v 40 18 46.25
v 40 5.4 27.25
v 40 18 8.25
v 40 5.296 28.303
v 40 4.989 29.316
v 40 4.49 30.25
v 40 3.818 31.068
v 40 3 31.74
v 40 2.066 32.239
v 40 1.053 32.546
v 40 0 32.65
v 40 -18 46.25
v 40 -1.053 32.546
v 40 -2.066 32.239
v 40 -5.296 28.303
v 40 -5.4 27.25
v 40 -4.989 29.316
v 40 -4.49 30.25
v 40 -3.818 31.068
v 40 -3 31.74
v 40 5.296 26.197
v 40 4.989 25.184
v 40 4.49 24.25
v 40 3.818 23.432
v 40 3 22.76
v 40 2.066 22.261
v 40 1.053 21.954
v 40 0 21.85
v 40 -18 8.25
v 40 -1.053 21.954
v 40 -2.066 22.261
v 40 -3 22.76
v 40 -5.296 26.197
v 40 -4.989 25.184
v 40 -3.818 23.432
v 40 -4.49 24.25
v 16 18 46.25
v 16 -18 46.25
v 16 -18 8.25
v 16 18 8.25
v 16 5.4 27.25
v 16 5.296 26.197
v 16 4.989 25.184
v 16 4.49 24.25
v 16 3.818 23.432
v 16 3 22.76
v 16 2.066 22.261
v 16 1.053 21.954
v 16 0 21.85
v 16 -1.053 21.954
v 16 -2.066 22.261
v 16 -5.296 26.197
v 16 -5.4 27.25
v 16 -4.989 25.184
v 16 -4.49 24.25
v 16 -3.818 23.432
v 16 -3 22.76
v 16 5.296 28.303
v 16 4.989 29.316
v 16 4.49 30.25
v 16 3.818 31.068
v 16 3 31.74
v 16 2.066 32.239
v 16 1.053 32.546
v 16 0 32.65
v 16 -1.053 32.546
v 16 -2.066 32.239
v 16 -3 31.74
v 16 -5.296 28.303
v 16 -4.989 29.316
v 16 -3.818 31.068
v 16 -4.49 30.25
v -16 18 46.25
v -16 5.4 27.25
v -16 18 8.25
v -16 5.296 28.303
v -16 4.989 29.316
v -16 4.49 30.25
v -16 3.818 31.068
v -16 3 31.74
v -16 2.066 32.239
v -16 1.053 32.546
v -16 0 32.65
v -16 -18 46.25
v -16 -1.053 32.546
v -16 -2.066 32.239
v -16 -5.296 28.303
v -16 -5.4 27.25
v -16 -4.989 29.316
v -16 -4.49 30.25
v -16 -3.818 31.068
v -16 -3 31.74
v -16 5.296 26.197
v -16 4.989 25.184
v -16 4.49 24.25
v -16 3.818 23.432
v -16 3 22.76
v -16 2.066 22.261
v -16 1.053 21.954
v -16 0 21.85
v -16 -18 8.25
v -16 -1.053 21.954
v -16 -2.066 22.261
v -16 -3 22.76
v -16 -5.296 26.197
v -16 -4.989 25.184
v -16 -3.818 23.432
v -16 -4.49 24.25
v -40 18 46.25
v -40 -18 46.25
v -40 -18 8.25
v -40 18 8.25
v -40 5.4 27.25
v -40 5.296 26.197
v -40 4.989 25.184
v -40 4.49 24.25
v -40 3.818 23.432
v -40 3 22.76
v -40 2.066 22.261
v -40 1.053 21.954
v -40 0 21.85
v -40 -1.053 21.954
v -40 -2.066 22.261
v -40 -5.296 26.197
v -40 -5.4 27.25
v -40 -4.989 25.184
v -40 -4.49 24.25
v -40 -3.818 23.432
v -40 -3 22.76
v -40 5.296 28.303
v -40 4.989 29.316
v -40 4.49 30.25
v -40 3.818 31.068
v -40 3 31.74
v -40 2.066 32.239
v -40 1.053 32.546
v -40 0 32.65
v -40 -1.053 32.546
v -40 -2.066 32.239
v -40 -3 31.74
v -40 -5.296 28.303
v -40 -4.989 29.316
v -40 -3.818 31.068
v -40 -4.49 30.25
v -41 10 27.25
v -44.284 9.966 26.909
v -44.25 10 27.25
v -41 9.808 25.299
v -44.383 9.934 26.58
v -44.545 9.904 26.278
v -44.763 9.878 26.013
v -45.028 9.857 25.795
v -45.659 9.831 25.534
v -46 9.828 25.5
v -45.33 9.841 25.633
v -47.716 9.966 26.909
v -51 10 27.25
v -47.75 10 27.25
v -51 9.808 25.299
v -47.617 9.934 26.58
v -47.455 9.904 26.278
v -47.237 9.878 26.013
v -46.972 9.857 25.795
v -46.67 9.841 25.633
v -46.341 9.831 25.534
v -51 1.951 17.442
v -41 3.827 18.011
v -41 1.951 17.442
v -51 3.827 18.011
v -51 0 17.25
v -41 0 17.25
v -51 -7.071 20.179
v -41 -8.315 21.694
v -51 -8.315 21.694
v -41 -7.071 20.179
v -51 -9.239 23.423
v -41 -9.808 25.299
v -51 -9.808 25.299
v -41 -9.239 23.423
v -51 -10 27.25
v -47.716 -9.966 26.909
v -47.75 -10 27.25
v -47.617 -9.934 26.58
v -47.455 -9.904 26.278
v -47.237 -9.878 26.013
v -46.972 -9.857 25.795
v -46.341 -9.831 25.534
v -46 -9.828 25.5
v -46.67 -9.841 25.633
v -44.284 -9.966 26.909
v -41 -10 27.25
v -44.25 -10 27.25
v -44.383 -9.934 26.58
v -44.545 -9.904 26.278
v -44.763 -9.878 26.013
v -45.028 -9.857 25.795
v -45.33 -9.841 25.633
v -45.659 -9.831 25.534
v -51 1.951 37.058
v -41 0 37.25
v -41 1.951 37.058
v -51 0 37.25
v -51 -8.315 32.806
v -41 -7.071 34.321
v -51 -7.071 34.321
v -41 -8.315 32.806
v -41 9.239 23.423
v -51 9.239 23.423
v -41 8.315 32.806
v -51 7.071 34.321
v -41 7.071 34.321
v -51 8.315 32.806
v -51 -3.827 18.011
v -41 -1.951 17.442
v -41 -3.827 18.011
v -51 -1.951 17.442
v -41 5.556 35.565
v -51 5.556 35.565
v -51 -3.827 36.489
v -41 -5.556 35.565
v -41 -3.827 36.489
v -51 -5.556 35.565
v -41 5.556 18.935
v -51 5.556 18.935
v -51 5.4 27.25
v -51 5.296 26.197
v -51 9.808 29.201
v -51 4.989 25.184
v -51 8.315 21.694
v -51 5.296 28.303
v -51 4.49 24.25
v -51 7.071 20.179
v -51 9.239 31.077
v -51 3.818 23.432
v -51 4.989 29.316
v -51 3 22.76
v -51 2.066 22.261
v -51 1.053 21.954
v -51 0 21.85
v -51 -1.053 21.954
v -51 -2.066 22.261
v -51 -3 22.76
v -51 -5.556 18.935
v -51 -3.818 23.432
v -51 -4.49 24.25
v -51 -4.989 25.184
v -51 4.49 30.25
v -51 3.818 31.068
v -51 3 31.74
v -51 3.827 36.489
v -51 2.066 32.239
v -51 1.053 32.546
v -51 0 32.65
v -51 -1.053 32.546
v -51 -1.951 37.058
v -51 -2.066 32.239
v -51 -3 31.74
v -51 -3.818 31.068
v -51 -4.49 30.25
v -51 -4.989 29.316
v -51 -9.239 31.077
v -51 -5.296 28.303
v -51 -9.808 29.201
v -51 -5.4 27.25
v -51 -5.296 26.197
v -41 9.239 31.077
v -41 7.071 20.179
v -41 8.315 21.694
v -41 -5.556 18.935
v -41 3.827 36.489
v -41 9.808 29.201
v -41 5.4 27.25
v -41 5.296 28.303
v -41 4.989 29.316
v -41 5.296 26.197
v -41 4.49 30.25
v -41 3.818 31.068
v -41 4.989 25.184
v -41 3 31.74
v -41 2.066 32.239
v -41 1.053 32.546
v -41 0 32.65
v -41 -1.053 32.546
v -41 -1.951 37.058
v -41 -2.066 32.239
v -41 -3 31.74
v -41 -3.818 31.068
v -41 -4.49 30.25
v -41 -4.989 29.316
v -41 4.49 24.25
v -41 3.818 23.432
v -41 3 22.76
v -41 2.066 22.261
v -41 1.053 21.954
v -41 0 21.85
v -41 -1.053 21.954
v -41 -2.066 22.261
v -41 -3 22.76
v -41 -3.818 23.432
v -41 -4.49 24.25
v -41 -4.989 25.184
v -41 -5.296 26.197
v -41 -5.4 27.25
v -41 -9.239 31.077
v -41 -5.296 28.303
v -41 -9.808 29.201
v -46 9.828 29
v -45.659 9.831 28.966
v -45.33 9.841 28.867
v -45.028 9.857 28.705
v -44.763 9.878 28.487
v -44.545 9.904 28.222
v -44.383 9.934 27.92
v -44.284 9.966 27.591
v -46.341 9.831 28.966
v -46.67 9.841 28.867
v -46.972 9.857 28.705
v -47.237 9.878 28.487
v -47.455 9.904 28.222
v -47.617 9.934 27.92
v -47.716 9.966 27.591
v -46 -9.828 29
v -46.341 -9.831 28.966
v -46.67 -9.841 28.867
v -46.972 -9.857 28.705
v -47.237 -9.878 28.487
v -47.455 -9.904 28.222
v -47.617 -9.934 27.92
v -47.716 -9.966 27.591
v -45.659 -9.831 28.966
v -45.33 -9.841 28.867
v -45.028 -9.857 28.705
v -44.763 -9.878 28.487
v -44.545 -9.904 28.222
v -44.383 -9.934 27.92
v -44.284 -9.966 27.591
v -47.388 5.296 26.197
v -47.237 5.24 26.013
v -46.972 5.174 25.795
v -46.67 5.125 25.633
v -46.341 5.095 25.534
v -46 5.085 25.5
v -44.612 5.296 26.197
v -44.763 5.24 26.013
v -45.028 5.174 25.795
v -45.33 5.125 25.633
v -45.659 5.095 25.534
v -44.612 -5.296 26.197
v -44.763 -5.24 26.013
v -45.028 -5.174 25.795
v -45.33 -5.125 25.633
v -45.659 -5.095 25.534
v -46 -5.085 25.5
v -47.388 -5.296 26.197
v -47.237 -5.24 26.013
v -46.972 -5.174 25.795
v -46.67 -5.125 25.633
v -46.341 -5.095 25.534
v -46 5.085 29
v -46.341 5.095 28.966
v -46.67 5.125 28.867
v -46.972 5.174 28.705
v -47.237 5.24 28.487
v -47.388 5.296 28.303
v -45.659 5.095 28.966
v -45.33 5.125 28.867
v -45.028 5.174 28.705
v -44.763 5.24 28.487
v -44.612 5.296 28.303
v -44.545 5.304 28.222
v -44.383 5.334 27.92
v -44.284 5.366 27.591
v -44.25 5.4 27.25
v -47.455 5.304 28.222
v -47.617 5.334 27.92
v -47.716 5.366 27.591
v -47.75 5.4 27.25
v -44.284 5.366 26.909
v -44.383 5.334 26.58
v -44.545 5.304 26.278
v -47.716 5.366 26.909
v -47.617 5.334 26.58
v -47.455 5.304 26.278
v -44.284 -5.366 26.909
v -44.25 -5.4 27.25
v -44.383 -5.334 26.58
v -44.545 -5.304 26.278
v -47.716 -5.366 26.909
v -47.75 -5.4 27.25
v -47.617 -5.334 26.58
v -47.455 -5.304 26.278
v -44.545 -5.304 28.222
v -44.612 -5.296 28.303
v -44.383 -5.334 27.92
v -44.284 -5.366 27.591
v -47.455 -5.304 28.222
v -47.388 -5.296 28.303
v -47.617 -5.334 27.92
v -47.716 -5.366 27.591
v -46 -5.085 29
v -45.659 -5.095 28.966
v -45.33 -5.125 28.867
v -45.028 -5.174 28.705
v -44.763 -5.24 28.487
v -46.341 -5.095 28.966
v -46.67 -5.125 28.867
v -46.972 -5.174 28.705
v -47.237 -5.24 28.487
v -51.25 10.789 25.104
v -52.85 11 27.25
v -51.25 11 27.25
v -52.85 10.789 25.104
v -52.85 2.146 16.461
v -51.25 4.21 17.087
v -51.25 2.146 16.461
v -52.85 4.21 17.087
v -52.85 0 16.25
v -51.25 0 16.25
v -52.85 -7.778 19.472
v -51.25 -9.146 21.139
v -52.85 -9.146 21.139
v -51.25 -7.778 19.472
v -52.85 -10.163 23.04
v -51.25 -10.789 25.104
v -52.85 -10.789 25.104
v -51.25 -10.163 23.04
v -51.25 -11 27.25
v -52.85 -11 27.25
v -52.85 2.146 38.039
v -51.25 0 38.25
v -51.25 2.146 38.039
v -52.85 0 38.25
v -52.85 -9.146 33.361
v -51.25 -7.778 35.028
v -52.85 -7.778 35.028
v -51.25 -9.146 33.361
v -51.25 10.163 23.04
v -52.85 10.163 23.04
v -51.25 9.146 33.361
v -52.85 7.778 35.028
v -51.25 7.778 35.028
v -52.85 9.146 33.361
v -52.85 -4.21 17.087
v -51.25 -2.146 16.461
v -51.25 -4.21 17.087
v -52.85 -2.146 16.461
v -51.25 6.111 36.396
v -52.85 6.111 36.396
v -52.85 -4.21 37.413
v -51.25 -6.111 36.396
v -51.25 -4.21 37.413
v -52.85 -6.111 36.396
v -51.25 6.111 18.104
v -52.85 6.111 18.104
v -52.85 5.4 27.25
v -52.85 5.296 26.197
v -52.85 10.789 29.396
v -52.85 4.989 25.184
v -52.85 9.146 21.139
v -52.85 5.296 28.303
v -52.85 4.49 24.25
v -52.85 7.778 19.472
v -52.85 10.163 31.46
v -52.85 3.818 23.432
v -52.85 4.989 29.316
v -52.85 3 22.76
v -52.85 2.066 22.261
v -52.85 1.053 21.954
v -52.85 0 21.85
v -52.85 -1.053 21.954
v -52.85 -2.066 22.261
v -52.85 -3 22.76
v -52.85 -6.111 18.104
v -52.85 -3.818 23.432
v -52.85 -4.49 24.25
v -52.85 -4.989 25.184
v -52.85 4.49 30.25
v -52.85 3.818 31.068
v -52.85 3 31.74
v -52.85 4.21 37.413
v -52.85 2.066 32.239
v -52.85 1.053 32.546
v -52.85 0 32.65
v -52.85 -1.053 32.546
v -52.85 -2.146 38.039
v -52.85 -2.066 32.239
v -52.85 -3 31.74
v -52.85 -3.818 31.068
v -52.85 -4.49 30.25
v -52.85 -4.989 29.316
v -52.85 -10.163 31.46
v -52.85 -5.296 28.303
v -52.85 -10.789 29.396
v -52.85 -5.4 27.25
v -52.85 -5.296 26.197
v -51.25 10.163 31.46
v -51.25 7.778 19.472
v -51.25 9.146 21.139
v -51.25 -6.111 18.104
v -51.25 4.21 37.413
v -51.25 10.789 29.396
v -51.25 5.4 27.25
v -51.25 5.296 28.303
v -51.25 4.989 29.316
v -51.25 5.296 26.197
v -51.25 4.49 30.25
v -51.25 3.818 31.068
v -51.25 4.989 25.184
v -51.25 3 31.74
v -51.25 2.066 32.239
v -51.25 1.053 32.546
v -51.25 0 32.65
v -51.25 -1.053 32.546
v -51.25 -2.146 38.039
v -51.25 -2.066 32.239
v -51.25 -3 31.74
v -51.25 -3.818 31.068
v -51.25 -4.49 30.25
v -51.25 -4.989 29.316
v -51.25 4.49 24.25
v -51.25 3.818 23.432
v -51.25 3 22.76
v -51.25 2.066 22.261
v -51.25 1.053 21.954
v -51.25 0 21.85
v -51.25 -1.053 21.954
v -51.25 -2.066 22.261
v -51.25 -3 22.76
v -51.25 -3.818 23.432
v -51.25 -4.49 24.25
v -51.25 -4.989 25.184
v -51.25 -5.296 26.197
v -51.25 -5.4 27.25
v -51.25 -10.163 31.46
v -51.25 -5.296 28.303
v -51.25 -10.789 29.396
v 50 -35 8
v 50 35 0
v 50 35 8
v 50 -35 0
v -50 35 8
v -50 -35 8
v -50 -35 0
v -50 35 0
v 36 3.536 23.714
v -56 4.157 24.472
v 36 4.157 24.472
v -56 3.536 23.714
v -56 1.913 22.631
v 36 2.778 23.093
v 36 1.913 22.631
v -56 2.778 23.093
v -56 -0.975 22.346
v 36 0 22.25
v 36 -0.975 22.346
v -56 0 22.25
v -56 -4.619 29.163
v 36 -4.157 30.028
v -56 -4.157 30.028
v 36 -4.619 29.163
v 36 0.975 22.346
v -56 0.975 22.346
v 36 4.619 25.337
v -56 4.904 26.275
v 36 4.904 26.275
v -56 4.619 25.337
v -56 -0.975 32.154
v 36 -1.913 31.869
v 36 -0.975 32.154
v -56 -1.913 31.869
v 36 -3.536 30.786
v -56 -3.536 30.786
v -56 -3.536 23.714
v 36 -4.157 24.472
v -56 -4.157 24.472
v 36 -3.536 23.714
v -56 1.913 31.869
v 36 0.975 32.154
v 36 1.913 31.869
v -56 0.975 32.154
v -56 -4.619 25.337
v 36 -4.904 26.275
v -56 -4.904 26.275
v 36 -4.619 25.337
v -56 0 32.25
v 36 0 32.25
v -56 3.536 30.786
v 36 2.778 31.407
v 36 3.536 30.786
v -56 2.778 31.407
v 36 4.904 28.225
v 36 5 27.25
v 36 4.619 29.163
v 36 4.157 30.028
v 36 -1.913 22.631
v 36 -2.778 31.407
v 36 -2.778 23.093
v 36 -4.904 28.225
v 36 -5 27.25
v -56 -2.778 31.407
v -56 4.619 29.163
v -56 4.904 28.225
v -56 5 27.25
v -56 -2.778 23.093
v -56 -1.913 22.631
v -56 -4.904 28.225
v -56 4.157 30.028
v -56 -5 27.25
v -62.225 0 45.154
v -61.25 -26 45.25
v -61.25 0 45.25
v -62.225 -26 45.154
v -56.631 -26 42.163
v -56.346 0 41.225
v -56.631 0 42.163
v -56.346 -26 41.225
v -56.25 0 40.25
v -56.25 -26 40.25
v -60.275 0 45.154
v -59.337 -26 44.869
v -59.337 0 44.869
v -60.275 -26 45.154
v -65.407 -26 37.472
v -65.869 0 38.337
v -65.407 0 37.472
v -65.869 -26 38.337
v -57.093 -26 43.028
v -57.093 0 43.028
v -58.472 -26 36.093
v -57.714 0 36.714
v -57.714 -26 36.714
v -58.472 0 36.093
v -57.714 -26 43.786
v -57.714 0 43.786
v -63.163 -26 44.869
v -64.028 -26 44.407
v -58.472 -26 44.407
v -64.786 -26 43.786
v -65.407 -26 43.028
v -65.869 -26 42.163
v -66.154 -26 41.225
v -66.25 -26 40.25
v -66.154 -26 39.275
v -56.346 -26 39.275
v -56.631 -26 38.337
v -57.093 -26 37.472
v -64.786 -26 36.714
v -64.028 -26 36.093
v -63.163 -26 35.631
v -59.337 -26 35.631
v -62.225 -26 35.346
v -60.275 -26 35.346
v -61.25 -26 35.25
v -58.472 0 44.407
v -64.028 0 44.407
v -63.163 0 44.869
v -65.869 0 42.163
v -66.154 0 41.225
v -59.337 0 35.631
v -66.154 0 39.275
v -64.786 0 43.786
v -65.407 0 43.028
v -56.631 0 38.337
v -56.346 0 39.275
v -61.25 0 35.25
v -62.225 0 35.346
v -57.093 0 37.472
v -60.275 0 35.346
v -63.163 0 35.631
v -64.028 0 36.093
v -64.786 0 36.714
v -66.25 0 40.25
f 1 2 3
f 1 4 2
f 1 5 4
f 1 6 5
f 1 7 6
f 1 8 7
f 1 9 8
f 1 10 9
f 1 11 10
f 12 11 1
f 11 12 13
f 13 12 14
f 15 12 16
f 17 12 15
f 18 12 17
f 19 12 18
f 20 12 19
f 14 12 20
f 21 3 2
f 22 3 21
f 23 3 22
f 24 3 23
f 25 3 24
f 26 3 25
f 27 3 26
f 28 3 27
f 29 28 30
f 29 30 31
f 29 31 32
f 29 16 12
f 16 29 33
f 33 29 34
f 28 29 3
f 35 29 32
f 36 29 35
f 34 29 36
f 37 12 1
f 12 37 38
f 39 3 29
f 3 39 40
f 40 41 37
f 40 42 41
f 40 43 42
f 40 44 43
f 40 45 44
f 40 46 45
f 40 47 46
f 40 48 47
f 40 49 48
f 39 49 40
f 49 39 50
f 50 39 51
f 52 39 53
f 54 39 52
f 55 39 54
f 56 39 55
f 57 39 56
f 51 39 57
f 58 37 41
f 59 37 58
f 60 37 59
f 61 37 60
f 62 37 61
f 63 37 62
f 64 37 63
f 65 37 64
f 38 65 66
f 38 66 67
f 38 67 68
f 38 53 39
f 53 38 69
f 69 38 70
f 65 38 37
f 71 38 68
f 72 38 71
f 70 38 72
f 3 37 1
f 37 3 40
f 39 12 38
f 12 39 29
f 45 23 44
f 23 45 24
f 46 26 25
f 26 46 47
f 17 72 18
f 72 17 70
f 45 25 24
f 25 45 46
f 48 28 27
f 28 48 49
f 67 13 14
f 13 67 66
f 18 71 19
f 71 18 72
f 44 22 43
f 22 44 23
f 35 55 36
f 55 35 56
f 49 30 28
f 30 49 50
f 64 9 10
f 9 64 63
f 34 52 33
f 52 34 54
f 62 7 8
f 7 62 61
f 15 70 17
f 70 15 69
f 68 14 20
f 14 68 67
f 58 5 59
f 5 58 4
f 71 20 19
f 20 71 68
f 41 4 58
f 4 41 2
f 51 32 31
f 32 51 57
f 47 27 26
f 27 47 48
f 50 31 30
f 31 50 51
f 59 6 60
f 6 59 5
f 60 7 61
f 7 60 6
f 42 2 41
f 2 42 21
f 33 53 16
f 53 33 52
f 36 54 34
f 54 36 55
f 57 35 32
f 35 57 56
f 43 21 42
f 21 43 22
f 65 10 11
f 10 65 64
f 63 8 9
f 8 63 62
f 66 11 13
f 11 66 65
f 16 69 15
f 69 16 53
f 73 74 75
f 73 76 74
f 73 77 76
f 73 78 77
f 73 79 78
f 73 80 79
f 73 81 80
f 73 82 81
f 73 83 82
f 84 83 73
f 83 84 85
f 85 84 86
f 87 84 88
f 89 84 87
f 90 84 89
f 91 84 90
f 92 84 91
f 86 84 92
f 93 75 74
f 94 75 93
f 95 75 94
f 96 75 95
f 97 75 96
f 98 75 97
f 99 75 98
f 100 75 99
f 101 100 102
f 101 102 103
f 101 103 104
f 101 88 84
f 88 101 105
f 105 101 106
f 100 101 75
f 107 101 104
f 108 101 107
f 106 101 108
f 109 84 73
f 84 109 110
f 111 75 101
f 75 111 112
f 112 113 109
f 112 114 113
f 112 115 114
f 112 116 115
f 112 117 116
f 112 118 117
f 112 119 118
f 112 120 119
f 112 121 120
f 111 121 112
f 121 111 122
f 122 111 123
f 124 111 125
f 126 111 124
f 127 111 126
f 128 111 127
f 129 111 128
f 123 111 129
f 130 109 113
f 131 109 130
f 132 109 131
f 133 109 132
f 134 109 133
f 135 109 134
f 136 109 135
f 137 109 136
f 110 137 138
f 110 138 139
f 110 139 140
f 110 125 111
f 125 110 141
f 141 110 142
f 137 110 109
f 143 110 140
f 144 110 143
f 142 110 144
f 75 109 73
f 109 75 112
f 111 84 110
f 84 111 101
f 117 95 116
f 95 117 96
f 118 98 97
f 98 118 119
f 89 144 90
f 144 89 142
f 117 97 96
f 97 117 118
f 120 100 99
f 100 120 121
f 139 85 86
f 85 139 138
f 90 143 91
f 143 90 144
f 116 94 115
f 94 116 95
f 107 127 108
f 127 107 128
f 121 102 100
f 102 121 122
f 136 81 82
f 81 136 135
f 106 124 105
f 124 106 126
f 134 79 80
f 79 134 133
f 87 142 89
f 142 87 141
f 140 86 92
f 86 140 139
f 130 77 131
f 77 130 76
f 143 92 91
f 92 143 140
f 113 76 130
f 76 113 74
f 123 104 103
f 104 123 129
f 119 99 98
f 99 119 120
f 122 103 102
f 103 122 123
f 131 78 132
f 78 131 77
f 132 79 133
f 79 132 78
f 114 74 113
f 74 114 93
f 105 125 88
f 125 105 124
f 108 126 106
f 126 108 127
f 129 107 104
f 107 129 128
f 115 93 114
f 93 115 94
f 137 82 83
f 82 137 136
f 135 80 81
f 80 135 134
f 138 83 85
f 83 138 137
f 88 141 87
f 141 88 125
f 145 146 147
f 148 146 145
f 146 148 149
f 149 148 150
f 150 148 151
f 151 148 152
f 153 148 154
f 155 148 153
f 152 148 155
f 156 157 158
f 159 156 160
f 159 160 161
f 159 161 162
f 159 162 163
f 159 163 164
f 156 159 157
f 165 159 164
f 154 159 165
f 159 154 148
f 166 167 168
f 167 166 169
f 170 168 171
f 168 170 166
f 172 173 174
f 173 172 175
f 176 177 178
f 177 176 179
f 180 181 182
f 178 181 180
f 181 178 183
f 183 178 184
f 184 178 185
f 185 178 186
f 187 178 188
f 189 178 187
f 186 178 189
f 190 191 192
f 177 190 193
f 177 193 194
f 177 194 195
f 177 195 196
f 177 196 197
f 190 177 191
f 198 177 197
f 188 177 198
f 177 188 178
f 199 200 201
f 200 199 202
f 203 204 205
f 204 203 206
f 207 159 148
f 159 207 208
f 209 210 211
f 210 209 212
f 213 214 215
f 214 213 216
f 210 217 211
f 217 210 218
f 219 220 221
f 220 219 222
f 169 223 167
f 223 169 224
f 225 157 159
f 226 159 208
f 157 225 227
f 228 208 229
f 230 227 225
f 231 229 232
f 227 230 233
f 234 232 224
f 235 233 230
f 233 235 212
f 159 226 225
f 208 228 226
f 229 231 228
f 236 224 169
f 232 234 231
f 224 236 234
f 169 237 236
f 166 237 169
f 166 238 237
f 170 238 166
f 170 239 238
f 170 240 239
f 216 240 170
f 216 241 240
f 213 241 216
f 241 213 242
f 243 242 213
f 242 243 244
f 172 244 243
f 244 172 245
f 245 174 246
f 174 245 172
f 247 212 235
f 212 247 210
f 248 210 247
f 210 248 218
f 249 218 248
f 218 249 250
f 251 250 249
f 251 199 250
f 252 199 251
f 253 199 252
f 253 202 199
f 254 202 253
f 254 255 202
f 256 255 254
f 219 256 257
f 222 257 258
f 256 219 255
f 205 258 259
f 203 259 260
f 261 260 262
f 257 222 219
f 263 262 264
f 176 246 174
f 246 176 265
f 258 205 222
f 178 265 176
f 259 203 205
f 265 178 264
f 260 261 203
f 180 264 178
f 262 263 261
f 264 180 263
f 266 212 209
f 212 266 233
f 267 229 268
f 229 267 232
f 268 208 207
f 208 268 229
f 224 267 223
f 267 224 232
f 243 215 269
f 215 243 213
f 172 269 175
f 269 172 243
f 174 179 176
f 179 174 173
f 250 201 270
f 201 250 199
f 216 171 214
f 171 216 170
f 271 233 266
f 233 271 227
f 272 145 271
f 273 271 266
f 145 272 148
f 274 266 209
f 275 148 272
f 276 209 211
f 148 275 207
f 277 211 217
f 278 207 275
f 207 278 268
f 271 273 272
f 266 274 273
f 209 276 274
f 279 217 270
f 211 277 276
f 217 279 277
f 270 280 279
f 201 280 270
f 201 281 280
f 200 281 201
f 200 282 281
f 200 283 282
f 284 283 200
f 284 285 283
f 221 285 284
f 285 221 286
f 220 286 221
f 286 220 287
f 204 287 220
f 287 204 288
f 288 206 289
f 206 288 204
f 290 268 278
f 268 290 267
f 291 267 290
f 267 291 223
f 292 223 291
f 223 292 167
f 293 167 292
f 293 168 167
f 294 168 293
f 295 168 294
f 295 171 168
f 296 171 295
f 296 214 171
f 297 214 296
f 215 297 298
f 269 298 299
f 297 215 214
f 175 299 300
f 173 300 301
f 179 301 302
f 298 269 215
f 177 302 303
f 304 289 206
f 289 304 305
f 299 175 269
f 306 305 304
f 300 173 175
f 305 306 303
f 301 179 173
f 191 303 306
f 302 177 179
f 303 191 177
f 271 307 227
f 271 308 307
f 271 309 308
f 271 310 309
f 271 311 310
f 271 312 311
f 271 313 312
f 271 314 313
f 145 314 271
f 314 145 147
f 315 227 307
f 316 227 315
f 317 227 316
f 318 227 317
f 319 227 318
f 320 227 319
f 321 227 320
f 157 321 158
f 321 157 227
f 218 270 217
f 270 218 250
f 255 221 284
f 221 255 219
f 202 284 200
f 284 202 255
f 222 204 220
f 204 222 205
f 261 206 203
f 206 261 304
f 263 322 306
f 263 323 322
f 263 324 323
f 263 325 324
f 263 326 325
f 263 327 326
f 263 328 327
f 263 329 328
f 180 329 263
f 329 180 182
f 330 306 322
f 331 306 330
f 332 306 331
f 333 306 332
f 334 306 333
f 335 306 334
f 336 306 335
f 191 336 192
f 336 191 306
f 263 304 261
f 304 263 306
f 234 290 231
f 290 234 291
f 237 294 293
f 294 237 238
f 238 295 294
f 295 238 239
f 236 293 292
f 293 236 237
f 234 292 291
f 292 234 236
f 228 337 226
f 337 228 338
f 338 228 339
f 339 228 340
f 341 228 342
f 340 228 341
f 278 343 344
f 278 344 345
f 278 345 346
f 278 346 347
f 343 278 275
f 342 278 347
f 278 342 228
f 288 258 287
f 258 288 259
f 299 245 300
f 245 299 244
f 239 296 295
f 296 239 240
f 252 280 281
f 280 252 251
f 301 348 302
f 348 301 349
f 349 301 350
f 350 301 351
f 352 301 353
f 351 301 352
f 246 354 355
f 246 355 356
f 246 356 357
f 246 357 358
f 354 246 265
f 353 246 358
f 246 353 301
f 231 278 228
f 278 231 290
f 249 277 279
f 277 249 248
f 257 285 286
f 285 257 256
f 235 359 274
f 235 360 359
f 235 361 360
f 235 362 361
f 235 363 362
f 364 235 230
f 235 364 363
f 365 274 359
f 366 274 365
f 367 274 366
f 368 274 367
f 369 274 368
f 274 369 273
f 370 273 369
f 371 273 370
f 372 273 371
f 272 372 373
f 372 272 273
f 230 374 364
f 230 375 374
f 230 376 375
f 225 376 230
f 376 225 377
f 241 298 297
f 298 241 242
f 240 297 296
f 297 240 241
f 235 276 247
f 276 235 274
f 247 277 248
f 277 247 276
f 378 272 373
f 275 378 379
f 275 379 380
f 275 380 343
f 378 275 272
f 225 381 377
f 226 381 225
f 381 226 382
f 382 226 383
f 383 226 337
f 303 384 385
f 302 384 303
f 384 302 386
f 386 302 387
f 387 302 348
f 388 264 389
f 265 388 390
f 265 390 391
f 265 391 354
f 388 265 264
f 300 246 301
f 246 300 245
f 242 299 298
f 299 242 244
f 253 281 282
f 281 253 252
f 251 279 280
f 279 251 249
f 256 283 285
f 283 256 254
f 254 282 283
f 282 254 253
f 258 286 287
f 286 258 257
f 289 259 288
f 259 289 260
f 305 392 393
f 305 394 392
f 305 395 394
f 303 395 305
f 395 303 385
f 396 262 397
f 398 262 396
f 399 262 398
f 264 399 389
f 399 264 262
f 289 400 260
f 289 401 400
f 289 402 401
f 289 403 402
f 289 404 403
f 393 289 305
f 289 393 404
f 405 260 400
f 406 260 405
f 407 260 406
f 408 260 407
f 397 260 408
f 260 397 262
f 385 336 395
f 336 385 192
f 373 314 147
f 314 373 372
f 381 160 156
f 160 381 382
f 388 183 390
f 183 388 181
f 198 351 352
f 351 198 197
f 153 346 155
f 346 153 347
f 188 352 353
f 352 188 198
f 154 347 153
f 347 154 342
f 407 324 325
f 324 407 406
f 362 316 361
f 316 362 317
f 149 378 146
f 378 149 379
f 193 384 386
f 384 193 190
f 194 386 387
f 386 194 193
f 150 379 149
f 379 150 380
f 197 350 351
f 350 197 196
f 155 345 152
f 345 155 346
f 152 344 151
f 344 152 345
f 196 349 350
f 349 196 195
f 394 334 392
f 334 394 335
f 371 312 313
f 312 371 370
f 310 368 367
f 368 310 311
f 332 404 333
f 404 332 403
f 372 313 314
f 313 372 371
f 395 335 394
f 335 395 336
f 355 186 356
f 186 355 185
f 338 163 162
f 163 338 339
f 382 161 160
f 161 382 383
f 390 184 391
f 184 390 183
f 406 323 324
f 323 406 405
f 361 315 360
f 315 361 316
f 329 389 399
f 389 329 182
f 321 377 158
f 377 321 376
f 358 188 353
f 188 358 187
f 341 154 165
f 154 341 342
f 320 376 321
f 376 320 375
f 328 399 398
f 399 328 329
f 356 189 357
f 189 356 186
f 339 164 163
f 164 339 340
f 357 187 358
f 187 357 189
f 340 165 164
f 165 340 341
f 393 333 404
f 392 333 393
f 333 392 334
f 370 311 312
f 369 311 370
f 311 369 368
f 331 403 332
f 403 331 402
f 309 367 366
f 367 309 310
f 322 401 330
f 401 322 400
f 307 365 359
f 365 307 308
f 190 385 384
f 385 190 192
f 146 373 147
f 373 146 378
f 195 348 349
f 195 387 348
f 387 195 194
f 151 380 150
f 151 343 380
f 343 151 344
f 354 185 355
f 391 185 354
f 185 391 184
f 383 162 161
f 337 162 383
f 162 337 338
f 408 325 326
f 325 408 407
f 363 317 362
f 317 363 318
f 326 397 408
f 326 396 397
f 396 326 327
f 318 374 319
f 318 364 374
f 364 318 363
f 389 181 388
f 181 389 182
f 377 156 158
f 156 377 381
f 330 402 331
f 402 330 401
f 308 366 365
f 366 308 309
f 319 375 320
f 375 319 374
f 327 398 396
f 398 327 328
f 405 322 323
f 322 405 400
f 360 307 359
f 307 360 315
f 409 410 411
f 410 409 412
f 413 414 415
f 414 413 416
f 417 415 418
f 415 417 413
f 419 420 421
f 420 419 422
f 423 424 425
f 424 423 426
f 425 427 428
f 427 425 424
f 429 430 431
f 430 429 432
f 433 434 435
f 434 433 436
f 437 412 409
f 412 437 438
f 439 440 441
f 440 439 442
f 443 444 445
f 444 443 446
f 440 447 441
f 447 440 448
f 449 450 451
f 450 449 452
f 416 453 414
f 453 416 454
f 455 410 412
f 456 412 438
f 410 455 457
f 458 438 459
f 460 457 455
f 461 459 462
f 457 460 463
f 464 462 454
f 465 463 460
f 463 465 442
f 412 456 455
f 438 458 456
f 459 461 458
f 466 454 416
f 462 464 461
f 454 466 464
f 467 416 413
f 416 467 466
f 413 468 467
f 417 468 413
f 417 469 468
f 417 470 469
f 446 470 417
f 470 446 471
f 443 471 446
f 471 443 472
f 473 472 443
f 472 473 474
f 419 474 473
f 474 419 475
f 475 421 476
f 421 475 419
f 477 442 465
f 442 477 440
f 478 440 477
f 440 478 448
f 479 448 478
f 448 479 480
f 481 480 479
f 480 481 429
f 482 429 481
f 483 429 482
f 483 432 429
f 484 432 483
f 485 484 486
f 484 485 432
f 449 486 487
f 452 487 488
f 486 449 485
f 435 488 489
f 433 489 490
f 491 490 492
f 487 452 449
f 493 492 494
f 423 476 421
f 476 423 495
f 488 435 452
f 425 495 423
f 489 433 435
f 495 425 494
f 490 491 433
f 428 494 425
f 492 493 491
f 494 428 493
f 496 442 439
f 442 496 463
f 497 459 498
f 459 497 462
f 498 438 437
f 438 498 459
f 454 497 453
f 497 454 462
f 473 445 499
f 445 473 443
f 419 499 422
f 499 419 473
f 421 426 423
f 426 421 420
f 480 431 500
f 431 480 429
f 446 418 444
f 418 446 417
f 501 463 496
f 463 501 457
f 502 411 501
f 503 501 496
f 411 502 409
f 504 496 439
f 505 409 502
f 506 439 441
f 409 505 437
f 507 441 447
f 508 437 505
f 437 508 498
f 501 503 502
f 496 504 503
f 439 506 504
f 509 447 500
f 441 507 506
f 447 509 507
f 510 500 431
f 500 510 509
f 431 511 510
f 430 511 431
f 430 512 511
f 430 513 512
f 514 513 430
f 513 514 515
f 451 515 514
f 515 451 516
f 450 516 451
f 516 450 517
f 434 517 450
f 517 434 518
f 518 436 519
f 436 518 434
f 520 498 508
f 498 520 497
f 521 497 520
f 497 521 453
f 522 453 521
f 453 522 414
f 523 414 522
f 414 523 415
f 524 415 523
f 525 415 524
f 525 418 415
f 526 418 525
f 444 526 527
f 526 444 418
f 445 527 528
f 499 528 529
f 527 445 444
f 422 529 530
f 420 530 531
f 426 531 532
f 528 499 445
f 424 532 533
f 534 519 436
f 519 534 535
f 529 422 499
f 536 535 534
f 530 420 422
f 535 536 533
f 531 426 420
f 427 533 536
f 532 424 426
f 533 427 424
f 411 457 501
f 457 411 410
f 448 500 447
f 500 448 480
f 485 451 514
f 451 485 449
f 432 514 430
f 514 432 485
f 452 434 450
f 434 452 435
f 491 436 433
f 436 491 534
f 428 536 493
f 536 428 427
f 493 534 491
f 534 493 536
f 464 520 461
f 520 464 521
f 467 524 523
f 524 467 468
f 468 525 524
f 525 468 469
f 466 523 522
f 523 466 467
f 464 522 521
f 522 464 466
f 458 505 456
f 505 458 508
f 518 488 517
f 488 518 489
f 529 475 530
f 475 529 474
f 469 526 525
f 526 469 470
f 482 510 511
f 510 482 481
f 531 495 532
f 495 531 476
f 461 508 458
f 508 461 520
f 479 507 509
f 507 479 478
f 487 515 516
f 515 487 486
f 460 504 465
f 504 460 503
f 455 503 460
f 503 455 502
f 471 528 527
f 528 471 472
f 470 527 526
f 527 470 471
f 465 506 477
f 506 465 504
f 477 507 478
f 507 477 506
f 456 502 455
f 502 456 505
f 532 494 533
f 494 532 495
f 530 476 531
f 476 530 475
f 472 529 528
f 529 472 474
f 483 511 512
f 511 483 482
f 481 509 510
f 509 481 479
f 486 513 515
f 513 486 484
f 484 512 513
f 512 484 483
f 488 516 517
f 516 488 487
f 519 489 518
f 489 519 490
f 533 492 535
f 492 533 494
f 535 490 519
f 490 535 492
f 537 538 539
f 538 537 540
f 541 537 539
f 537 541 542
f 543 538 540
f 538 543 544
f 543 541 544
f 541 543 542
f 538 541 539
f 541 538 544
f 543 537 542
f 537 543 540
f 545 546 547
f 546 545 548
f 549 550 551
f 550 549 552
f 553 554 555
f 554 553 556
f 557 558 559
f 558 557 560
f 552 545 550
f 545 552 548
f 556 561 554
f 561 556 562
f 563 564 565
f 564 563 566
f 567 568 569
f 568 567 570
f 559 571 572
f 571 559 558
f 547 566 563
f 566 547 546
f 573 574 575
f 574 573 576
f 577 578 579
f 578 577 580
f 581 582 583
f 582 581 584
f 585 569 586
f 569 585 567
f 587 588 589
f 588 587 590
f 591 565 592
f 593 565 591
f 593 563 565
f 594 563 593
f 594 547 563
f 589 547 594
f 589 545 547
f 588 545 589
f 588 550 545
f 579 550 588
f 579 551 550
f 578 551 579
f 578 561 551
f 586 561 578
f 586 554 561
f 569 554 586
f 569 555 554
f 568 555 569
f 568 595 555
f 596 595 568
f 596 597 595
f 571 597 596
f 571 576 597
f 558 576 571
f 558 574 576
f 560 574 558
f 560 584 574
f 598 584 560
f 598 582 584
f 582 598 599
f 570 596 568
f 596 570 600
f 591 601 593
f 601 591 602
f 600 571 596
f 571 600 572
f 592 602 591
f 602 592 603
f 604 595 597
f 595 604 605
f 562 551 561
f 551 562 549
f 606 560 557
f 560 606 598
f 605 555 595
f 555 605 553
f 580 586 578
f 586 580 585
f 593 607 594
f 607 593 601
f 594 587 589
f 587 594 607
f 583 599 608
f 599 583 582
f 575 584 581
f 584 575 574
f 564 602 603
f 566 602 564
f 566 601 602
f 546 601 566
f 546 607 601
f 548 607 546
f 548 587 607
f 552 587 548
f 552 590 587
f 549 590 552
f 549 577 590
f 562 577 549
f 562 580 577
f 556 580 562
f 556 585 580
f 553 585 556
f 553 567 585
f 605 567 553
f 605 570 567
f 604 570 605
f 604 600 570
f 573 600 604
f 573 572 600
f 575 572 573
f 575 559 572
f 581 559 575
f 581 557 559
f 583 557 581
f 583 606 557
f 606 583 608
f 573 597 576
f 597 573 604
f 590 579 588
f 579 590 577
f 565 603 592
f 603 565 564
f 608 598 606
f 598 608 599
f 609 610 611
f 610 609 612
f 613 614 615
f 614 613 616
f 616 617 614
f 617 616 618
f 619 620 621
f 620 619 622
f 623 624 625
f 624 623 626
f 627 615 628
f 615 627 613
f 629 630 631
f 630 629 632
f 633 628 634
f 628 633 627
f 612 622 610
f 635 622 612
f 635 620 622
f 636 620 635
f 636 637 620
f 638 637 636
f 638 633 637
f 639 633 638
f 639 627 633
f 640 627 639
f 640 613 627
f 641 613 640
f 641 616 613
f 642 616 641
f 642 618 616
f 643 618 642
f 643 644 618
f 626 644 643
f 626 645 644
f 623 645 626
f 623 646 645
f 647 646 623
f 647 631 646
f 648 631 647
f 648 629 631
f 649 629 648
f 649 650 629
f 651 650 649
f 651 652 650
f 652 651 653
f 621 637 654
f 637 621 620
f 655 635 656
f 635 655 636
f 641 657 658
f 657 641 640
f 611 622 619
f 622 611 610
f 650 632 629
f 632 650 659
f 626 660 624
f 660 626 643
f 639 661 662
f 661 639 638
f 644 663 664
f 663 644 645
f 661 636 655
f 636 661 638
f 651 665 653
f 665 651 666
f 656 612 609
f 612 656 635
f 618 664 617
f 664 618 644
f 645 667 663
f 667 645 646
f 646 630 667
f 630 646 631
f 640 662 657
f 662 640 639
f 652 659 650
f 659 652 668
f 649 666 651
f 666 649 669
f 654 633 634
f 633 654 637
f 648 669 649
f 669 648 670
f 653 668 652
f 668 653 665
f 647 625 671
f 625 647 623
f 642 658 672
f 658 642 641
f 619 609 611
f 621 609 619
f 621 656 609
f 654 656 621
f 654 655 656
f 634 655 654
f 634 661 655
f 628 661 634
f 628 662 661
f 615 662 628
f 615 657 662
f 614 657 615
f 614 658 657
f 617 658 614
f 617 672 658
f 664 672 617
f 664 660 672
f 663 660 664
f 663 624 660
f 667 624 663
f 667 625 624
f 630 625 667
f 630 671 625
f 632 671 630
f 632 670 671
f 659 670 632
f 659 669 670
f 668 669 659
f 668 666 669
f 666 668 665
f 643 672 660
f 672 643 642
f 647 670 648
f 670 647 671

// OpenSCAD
$fn = 32;

// ------------------------------------------------------------------------
// Machine vise: screw d10, jaws 24 x 38 mm
// Every part is its own module, assembly() places every instance.
// ------------------------------------------------------------------------

// --- part 1 ---
module vise_bed() {
  difference() {
    translate([-50, -35, 0]) cube([100, 70, 8]);
  }
}

// --- part 2 ---
module vise_jaw() {
  difference() {
    translate([-12, -18, 0]) cube([24, 36, 38]);
    translate([0, 0, 19]) rotate([0, 90, 0]) cylinder(h = 26, d = 10.8, center = true);
  }
}

// --- part 3 ---
module vise_screw() {
  translate([0, 0, -46]) cylinder(h = 92, d = 10);
}

// --- part 4 ---
module screw_collar() {
  difference() {
    cylinder(h = 10, d = 20);
    translate([0, 0, -1]) cylinder(h = 12, d = 10.8);
    translate([0, 0, 5]) rotate([90, 0, 0]) cylinder(h = 22, d = 3.5, center = true);
  }
}

// --- part 5 ---
module screw_washer() {
  difference() {
      translate([0, 0, 0]) cylinder(h = 1.6, d = 22);
      translate([0, 0, -1]) cylinder(h = 3.6, d = 10.8);
    }
}

// --- part 6 ---
module vise_handle() {
  cylinder(h = 26, d = 10);
}

// --- assembly ---
module assembly() {
  color([0.80, 0.24, 0.20]) translate([0, 0, 0]) rotate([0, 0, 0]) vise_bed();
  color([0.20, 0.45, 0.75]) translate([28, 0, 8.25]) rotate([0, 0, 0]) vise_jaw();
  color([0.25, 0.62, 0.32]) translate([-28, 0, 8.25]) rotate([0, 0, 0]) vise_jaw();
  color([0.92, 0.70, 0.18]) translate([-10, 0, 27.25]) rotate([0, 90, 0]) vise_screw();
  color([0.58, 0.35, 0.70]) translate([-51, 0, 27.25]) rotate([0, 90, 0]) screw_collar();
  color([0.16, 0.66, 0.66]) translate([-52.85, 0, 27.25]) rotate([0, 90, 0]) screw_washer();
  color([0.85, 0.48, 0.18]) translate([-61.25, 0, 40.25]) rotate([90, 0, 0]) vise_handle();
}

assembly();
